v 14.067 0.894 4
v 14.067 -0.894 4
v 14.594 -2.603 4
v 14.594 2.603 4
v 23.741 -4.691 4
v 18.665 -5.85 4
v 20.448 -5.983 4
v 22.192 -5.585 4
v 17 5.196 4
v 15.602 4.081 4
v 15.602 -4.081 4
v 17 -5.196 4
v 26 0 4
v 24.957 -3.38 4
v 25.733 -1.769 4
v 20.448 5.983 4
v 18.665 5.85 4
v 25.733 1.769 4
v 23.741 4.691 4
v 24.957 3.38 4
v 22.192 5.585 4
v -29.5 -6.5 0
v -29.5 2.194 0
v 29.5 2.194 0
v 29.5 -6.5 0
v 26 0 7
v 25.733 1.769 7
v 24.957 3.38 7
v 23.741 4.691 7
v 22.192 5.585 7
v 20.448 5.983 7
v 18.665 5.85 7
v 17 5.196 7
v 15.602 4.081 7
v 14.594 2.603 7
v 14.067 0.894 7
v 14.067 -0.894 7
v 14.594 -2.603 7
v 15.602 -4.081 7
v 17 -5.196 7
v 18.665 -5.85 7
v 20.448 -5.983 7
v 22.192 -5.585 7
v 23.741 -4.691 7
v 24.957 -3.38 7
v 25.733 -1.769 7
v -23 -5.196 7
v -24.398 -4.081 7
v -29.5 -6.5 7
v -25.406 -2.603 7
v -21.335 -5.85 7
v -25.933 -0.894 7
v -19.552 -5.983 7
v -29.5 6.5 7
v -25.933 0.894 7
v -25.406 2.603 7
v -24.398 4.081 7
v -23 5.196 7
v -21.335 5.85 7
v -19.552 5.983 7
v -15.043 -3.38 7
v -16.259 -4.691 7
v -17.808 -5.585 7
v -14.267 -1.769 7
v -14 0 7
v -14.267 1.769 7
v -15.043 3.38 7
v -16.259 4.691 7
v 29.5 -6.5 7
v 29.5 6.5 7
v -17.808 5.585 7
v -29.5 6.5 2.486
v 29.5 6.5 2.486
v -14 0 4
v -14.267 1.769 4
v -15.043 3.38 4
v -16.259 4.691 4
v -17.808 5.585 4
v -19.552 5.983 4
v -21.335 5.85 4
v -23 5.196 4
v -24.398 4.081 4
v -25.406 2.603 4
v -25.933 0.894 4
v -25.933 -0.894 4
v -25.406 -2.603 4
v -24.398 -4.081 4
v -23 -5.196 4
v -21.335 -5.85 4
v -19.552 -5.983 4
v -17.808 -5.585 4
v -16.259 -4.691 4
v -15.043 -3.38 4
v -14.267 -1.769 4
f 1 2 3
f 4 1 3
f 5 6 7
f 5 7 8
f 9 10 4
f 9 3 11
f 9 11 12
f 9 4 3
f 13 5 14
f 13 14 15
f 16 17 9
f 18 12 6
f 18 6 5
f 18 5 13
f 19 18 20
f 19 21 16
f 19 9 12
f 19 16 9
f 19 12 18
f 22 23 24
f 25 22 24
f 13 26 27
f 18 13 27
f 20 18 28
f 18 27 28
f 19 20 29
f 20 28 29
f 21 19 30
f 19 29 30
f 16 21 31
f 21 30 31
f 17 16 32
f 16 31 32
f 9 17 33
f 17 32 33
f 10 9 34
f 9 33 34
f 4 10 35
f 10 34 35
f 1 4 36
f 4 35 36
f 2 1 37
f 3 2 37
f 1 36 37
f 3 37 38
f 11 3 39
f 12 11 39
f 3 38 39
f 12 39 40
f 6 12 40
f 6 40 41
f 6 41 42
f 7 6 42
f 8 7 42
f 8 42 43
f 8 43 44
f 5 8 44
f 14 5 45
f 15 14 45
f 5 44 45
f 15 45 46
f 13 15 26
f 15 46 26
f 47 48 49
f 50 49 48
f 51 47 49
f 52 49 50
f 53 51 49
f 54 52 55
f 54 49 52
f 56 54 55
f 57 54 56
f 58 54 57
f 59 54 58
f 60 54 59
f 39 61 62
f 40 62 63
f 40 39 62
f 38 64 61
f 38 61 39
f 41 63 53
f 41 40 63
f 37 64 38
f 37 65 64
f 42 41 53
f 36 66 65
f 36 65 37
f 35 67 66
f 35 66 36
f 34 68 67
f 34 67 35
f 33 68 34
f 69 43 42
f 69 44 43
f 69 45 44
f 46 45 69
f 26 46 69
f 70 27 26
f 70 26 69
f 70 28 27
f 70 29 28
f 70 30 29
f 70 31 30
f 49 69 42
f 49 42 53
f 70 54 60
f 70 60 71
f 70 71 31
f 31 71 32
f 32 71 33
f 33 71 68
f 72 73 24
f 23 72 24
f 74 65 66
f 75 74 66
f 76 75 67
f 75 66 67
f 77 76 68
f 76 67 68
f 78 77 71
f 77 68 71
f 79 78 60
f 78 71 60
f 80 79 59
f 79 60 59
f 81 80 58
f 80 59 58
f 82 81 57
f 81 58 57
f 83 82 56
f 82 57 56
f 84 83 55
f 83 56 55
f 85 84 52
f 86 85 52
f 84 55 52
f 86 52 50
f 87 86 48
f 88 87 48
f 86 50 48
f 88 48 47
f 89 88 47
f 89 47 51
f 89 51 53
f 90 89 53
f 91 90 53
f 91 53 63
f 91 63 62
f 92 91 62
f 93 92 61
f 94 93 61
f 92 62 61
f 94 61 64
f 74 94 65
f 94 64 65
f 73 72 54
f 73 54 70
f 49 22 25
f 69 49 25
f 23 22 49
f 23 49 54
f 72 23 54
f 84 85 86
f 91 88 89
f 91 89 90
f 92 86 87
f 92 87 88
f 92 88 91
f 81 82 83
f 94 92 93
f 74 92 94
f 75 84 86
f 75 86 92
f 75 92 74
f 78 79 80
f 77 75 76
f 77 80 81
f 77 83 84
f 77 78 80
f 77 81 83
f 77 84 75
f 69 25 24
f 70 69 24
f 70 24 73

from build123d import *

# Parameters (mm, degrees)
F0_W     = 59
F0_H     = 13
F1_DEPTH = 7
F2_R     = 6
F3_DEPTH = 3
F5_DEPTH = 70


with BuildPart() as f1:
    # F0 (on Top) → F1 (new body)
    with BuildSketch(Plane.XY):
        Rectangle(F0_W, F0_H)
    extrude(amount=F1_DEPTH)

    # F2 (on face) → F3 (cut)
    with BuildSketch(Plane.XY.offset(7)):
        with Locations((-20, 0)):
            Circle(F2_R)
        with Locations((20, 0)):
            Circle(F2_R)
    extrude(amount=-F3_DEPTH, mode=Mode.SUBTRACT)

    # F4 (on face) → F5 (cut)
    with BuildSketch(Plane.YZ.offset(29.5)):
        Polygon((2.194, 0), (6.5, 0), (6.5, 2.48607), align=None)
    extrude(amount=-F5_DEPTH, mode=Mode.SUBTRACT)


solid = f1.part
